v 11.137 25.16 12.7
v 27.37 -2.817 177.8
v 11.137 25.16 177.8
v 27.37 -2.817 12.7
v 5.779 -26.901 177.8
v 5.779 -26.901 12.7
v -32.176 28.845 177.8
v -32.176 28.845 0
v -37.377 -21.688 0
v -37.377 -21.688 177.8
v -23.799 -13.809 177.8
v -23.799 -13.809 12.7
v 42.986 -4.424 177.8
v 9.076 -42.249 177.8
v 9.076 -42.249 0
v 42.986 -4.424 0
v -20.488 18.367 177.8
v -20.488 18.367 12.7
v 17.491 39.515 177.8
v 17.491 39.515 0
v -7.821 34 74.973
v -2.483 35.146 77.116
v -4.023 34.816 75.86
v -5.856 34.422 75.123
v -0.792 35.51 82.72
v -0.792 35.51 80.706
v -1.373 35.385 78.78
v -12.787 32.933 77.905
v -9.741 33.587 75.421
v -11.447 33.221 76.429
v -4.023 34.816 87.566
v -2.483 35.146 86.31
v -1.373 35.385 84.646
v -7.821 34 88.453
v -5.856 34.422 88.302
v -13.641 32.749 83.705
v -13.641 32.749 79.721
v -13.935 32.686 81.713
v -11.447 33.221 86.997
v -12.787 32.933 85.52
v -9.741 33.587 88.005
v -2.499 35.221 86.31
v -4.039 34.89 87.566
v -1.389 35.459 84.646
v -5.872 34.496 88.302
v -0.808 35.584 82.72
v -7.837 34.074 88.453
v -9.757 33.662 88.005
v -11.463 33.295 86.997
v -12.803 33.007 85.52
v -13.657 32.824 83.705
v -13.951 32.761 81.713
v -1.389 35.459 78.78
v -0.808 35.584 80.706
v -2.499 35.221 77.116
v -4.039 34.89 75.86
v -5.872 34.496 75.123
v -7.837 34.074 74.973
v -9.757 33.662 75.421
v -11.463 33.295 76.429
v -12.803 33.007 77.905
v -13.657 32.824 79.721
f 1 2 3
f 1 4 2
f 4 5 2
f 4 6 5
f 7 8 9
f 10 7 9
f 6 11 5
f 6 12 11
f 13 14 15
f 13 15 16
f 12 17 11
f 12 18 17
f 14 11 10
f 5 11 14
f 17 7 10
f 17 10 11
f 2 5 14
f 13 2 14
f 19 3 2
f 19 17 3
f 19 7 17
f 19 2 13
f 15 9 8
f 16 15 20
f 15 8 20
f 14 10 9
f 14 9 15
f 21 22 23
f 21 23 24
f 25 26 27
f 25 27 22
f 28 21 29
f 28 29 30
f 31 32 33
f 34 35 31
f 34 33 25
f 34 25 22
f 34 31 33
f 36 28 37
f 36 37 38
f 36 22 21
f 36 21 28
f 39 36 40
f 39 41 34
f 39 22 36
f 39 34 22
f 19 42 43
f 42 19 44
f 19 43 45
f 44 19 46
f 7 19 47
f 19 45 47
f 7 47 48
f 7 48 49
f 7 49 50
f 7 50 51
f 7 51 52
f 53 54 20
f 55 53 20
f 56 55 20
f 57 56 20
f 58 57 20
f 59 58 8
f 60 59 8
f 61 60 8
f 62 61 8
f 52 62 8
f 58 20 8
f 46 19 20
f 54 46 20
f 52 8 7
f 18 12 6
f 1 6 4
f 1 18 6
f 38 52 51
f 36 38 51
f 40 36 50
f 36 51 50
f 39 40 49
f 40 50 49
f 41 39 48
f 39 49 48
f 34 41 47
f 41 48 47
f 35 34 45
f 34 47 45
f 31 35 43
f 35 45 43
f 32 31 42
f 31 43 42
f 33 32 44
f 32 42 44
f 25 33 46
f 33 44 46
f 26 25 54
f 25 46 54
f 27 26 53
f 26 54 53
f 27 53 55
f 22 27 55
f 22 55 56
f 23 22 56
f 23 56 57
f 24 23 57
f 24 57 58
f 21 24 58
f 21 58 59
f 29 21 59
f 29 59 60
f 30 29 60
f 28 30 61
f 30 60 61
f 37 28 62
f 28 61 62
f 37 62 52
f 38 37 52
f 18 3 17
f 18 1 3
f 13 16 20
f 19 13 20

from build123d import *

# Parameters (mm, degrees)
F1_DEPTH = 177.8
F2_T     = -12.7
F3_R     = 6.7589749521
F4_DEPTH = 0.0762


with BuildPart() as f1:
    # F0 (on Top) → F1 (new body)
    with BuildSketch(Plane.XY):
        Polygon((42.9860351945, -4.42373426), (17.4906366902, 39.5151398165), (-32.1762272351, 28.8454337368), (-37.3766387512, -21.687681347), (9.0761941016, -42.2491579463), align=None)
    extrude(amount=F1_DEPTH)

    # F2
    f2_openings = [f1.faces().sort_by_distance(p)[0] for p in [
        (0, 0, 177.8),
    ]]
    offset(amount=F2_T, openings=f2_openings)

    # F3 (on face) → F4 (cut)
    with BuildSketch(Plane(origin=(-7.3427952725, 34.1802867766, 0), x_dir=(-0.9776941718, -0.2100335842, 0), z_dir=(-0.2100335842, 0.9776941718, 0))):
        with Locations((0, 81.7129537463)):
            Circle(F3_R)
    extrude(amount=-F4_DEPTH, mode=Mode.SUBTRACT)


solid = f1.part
